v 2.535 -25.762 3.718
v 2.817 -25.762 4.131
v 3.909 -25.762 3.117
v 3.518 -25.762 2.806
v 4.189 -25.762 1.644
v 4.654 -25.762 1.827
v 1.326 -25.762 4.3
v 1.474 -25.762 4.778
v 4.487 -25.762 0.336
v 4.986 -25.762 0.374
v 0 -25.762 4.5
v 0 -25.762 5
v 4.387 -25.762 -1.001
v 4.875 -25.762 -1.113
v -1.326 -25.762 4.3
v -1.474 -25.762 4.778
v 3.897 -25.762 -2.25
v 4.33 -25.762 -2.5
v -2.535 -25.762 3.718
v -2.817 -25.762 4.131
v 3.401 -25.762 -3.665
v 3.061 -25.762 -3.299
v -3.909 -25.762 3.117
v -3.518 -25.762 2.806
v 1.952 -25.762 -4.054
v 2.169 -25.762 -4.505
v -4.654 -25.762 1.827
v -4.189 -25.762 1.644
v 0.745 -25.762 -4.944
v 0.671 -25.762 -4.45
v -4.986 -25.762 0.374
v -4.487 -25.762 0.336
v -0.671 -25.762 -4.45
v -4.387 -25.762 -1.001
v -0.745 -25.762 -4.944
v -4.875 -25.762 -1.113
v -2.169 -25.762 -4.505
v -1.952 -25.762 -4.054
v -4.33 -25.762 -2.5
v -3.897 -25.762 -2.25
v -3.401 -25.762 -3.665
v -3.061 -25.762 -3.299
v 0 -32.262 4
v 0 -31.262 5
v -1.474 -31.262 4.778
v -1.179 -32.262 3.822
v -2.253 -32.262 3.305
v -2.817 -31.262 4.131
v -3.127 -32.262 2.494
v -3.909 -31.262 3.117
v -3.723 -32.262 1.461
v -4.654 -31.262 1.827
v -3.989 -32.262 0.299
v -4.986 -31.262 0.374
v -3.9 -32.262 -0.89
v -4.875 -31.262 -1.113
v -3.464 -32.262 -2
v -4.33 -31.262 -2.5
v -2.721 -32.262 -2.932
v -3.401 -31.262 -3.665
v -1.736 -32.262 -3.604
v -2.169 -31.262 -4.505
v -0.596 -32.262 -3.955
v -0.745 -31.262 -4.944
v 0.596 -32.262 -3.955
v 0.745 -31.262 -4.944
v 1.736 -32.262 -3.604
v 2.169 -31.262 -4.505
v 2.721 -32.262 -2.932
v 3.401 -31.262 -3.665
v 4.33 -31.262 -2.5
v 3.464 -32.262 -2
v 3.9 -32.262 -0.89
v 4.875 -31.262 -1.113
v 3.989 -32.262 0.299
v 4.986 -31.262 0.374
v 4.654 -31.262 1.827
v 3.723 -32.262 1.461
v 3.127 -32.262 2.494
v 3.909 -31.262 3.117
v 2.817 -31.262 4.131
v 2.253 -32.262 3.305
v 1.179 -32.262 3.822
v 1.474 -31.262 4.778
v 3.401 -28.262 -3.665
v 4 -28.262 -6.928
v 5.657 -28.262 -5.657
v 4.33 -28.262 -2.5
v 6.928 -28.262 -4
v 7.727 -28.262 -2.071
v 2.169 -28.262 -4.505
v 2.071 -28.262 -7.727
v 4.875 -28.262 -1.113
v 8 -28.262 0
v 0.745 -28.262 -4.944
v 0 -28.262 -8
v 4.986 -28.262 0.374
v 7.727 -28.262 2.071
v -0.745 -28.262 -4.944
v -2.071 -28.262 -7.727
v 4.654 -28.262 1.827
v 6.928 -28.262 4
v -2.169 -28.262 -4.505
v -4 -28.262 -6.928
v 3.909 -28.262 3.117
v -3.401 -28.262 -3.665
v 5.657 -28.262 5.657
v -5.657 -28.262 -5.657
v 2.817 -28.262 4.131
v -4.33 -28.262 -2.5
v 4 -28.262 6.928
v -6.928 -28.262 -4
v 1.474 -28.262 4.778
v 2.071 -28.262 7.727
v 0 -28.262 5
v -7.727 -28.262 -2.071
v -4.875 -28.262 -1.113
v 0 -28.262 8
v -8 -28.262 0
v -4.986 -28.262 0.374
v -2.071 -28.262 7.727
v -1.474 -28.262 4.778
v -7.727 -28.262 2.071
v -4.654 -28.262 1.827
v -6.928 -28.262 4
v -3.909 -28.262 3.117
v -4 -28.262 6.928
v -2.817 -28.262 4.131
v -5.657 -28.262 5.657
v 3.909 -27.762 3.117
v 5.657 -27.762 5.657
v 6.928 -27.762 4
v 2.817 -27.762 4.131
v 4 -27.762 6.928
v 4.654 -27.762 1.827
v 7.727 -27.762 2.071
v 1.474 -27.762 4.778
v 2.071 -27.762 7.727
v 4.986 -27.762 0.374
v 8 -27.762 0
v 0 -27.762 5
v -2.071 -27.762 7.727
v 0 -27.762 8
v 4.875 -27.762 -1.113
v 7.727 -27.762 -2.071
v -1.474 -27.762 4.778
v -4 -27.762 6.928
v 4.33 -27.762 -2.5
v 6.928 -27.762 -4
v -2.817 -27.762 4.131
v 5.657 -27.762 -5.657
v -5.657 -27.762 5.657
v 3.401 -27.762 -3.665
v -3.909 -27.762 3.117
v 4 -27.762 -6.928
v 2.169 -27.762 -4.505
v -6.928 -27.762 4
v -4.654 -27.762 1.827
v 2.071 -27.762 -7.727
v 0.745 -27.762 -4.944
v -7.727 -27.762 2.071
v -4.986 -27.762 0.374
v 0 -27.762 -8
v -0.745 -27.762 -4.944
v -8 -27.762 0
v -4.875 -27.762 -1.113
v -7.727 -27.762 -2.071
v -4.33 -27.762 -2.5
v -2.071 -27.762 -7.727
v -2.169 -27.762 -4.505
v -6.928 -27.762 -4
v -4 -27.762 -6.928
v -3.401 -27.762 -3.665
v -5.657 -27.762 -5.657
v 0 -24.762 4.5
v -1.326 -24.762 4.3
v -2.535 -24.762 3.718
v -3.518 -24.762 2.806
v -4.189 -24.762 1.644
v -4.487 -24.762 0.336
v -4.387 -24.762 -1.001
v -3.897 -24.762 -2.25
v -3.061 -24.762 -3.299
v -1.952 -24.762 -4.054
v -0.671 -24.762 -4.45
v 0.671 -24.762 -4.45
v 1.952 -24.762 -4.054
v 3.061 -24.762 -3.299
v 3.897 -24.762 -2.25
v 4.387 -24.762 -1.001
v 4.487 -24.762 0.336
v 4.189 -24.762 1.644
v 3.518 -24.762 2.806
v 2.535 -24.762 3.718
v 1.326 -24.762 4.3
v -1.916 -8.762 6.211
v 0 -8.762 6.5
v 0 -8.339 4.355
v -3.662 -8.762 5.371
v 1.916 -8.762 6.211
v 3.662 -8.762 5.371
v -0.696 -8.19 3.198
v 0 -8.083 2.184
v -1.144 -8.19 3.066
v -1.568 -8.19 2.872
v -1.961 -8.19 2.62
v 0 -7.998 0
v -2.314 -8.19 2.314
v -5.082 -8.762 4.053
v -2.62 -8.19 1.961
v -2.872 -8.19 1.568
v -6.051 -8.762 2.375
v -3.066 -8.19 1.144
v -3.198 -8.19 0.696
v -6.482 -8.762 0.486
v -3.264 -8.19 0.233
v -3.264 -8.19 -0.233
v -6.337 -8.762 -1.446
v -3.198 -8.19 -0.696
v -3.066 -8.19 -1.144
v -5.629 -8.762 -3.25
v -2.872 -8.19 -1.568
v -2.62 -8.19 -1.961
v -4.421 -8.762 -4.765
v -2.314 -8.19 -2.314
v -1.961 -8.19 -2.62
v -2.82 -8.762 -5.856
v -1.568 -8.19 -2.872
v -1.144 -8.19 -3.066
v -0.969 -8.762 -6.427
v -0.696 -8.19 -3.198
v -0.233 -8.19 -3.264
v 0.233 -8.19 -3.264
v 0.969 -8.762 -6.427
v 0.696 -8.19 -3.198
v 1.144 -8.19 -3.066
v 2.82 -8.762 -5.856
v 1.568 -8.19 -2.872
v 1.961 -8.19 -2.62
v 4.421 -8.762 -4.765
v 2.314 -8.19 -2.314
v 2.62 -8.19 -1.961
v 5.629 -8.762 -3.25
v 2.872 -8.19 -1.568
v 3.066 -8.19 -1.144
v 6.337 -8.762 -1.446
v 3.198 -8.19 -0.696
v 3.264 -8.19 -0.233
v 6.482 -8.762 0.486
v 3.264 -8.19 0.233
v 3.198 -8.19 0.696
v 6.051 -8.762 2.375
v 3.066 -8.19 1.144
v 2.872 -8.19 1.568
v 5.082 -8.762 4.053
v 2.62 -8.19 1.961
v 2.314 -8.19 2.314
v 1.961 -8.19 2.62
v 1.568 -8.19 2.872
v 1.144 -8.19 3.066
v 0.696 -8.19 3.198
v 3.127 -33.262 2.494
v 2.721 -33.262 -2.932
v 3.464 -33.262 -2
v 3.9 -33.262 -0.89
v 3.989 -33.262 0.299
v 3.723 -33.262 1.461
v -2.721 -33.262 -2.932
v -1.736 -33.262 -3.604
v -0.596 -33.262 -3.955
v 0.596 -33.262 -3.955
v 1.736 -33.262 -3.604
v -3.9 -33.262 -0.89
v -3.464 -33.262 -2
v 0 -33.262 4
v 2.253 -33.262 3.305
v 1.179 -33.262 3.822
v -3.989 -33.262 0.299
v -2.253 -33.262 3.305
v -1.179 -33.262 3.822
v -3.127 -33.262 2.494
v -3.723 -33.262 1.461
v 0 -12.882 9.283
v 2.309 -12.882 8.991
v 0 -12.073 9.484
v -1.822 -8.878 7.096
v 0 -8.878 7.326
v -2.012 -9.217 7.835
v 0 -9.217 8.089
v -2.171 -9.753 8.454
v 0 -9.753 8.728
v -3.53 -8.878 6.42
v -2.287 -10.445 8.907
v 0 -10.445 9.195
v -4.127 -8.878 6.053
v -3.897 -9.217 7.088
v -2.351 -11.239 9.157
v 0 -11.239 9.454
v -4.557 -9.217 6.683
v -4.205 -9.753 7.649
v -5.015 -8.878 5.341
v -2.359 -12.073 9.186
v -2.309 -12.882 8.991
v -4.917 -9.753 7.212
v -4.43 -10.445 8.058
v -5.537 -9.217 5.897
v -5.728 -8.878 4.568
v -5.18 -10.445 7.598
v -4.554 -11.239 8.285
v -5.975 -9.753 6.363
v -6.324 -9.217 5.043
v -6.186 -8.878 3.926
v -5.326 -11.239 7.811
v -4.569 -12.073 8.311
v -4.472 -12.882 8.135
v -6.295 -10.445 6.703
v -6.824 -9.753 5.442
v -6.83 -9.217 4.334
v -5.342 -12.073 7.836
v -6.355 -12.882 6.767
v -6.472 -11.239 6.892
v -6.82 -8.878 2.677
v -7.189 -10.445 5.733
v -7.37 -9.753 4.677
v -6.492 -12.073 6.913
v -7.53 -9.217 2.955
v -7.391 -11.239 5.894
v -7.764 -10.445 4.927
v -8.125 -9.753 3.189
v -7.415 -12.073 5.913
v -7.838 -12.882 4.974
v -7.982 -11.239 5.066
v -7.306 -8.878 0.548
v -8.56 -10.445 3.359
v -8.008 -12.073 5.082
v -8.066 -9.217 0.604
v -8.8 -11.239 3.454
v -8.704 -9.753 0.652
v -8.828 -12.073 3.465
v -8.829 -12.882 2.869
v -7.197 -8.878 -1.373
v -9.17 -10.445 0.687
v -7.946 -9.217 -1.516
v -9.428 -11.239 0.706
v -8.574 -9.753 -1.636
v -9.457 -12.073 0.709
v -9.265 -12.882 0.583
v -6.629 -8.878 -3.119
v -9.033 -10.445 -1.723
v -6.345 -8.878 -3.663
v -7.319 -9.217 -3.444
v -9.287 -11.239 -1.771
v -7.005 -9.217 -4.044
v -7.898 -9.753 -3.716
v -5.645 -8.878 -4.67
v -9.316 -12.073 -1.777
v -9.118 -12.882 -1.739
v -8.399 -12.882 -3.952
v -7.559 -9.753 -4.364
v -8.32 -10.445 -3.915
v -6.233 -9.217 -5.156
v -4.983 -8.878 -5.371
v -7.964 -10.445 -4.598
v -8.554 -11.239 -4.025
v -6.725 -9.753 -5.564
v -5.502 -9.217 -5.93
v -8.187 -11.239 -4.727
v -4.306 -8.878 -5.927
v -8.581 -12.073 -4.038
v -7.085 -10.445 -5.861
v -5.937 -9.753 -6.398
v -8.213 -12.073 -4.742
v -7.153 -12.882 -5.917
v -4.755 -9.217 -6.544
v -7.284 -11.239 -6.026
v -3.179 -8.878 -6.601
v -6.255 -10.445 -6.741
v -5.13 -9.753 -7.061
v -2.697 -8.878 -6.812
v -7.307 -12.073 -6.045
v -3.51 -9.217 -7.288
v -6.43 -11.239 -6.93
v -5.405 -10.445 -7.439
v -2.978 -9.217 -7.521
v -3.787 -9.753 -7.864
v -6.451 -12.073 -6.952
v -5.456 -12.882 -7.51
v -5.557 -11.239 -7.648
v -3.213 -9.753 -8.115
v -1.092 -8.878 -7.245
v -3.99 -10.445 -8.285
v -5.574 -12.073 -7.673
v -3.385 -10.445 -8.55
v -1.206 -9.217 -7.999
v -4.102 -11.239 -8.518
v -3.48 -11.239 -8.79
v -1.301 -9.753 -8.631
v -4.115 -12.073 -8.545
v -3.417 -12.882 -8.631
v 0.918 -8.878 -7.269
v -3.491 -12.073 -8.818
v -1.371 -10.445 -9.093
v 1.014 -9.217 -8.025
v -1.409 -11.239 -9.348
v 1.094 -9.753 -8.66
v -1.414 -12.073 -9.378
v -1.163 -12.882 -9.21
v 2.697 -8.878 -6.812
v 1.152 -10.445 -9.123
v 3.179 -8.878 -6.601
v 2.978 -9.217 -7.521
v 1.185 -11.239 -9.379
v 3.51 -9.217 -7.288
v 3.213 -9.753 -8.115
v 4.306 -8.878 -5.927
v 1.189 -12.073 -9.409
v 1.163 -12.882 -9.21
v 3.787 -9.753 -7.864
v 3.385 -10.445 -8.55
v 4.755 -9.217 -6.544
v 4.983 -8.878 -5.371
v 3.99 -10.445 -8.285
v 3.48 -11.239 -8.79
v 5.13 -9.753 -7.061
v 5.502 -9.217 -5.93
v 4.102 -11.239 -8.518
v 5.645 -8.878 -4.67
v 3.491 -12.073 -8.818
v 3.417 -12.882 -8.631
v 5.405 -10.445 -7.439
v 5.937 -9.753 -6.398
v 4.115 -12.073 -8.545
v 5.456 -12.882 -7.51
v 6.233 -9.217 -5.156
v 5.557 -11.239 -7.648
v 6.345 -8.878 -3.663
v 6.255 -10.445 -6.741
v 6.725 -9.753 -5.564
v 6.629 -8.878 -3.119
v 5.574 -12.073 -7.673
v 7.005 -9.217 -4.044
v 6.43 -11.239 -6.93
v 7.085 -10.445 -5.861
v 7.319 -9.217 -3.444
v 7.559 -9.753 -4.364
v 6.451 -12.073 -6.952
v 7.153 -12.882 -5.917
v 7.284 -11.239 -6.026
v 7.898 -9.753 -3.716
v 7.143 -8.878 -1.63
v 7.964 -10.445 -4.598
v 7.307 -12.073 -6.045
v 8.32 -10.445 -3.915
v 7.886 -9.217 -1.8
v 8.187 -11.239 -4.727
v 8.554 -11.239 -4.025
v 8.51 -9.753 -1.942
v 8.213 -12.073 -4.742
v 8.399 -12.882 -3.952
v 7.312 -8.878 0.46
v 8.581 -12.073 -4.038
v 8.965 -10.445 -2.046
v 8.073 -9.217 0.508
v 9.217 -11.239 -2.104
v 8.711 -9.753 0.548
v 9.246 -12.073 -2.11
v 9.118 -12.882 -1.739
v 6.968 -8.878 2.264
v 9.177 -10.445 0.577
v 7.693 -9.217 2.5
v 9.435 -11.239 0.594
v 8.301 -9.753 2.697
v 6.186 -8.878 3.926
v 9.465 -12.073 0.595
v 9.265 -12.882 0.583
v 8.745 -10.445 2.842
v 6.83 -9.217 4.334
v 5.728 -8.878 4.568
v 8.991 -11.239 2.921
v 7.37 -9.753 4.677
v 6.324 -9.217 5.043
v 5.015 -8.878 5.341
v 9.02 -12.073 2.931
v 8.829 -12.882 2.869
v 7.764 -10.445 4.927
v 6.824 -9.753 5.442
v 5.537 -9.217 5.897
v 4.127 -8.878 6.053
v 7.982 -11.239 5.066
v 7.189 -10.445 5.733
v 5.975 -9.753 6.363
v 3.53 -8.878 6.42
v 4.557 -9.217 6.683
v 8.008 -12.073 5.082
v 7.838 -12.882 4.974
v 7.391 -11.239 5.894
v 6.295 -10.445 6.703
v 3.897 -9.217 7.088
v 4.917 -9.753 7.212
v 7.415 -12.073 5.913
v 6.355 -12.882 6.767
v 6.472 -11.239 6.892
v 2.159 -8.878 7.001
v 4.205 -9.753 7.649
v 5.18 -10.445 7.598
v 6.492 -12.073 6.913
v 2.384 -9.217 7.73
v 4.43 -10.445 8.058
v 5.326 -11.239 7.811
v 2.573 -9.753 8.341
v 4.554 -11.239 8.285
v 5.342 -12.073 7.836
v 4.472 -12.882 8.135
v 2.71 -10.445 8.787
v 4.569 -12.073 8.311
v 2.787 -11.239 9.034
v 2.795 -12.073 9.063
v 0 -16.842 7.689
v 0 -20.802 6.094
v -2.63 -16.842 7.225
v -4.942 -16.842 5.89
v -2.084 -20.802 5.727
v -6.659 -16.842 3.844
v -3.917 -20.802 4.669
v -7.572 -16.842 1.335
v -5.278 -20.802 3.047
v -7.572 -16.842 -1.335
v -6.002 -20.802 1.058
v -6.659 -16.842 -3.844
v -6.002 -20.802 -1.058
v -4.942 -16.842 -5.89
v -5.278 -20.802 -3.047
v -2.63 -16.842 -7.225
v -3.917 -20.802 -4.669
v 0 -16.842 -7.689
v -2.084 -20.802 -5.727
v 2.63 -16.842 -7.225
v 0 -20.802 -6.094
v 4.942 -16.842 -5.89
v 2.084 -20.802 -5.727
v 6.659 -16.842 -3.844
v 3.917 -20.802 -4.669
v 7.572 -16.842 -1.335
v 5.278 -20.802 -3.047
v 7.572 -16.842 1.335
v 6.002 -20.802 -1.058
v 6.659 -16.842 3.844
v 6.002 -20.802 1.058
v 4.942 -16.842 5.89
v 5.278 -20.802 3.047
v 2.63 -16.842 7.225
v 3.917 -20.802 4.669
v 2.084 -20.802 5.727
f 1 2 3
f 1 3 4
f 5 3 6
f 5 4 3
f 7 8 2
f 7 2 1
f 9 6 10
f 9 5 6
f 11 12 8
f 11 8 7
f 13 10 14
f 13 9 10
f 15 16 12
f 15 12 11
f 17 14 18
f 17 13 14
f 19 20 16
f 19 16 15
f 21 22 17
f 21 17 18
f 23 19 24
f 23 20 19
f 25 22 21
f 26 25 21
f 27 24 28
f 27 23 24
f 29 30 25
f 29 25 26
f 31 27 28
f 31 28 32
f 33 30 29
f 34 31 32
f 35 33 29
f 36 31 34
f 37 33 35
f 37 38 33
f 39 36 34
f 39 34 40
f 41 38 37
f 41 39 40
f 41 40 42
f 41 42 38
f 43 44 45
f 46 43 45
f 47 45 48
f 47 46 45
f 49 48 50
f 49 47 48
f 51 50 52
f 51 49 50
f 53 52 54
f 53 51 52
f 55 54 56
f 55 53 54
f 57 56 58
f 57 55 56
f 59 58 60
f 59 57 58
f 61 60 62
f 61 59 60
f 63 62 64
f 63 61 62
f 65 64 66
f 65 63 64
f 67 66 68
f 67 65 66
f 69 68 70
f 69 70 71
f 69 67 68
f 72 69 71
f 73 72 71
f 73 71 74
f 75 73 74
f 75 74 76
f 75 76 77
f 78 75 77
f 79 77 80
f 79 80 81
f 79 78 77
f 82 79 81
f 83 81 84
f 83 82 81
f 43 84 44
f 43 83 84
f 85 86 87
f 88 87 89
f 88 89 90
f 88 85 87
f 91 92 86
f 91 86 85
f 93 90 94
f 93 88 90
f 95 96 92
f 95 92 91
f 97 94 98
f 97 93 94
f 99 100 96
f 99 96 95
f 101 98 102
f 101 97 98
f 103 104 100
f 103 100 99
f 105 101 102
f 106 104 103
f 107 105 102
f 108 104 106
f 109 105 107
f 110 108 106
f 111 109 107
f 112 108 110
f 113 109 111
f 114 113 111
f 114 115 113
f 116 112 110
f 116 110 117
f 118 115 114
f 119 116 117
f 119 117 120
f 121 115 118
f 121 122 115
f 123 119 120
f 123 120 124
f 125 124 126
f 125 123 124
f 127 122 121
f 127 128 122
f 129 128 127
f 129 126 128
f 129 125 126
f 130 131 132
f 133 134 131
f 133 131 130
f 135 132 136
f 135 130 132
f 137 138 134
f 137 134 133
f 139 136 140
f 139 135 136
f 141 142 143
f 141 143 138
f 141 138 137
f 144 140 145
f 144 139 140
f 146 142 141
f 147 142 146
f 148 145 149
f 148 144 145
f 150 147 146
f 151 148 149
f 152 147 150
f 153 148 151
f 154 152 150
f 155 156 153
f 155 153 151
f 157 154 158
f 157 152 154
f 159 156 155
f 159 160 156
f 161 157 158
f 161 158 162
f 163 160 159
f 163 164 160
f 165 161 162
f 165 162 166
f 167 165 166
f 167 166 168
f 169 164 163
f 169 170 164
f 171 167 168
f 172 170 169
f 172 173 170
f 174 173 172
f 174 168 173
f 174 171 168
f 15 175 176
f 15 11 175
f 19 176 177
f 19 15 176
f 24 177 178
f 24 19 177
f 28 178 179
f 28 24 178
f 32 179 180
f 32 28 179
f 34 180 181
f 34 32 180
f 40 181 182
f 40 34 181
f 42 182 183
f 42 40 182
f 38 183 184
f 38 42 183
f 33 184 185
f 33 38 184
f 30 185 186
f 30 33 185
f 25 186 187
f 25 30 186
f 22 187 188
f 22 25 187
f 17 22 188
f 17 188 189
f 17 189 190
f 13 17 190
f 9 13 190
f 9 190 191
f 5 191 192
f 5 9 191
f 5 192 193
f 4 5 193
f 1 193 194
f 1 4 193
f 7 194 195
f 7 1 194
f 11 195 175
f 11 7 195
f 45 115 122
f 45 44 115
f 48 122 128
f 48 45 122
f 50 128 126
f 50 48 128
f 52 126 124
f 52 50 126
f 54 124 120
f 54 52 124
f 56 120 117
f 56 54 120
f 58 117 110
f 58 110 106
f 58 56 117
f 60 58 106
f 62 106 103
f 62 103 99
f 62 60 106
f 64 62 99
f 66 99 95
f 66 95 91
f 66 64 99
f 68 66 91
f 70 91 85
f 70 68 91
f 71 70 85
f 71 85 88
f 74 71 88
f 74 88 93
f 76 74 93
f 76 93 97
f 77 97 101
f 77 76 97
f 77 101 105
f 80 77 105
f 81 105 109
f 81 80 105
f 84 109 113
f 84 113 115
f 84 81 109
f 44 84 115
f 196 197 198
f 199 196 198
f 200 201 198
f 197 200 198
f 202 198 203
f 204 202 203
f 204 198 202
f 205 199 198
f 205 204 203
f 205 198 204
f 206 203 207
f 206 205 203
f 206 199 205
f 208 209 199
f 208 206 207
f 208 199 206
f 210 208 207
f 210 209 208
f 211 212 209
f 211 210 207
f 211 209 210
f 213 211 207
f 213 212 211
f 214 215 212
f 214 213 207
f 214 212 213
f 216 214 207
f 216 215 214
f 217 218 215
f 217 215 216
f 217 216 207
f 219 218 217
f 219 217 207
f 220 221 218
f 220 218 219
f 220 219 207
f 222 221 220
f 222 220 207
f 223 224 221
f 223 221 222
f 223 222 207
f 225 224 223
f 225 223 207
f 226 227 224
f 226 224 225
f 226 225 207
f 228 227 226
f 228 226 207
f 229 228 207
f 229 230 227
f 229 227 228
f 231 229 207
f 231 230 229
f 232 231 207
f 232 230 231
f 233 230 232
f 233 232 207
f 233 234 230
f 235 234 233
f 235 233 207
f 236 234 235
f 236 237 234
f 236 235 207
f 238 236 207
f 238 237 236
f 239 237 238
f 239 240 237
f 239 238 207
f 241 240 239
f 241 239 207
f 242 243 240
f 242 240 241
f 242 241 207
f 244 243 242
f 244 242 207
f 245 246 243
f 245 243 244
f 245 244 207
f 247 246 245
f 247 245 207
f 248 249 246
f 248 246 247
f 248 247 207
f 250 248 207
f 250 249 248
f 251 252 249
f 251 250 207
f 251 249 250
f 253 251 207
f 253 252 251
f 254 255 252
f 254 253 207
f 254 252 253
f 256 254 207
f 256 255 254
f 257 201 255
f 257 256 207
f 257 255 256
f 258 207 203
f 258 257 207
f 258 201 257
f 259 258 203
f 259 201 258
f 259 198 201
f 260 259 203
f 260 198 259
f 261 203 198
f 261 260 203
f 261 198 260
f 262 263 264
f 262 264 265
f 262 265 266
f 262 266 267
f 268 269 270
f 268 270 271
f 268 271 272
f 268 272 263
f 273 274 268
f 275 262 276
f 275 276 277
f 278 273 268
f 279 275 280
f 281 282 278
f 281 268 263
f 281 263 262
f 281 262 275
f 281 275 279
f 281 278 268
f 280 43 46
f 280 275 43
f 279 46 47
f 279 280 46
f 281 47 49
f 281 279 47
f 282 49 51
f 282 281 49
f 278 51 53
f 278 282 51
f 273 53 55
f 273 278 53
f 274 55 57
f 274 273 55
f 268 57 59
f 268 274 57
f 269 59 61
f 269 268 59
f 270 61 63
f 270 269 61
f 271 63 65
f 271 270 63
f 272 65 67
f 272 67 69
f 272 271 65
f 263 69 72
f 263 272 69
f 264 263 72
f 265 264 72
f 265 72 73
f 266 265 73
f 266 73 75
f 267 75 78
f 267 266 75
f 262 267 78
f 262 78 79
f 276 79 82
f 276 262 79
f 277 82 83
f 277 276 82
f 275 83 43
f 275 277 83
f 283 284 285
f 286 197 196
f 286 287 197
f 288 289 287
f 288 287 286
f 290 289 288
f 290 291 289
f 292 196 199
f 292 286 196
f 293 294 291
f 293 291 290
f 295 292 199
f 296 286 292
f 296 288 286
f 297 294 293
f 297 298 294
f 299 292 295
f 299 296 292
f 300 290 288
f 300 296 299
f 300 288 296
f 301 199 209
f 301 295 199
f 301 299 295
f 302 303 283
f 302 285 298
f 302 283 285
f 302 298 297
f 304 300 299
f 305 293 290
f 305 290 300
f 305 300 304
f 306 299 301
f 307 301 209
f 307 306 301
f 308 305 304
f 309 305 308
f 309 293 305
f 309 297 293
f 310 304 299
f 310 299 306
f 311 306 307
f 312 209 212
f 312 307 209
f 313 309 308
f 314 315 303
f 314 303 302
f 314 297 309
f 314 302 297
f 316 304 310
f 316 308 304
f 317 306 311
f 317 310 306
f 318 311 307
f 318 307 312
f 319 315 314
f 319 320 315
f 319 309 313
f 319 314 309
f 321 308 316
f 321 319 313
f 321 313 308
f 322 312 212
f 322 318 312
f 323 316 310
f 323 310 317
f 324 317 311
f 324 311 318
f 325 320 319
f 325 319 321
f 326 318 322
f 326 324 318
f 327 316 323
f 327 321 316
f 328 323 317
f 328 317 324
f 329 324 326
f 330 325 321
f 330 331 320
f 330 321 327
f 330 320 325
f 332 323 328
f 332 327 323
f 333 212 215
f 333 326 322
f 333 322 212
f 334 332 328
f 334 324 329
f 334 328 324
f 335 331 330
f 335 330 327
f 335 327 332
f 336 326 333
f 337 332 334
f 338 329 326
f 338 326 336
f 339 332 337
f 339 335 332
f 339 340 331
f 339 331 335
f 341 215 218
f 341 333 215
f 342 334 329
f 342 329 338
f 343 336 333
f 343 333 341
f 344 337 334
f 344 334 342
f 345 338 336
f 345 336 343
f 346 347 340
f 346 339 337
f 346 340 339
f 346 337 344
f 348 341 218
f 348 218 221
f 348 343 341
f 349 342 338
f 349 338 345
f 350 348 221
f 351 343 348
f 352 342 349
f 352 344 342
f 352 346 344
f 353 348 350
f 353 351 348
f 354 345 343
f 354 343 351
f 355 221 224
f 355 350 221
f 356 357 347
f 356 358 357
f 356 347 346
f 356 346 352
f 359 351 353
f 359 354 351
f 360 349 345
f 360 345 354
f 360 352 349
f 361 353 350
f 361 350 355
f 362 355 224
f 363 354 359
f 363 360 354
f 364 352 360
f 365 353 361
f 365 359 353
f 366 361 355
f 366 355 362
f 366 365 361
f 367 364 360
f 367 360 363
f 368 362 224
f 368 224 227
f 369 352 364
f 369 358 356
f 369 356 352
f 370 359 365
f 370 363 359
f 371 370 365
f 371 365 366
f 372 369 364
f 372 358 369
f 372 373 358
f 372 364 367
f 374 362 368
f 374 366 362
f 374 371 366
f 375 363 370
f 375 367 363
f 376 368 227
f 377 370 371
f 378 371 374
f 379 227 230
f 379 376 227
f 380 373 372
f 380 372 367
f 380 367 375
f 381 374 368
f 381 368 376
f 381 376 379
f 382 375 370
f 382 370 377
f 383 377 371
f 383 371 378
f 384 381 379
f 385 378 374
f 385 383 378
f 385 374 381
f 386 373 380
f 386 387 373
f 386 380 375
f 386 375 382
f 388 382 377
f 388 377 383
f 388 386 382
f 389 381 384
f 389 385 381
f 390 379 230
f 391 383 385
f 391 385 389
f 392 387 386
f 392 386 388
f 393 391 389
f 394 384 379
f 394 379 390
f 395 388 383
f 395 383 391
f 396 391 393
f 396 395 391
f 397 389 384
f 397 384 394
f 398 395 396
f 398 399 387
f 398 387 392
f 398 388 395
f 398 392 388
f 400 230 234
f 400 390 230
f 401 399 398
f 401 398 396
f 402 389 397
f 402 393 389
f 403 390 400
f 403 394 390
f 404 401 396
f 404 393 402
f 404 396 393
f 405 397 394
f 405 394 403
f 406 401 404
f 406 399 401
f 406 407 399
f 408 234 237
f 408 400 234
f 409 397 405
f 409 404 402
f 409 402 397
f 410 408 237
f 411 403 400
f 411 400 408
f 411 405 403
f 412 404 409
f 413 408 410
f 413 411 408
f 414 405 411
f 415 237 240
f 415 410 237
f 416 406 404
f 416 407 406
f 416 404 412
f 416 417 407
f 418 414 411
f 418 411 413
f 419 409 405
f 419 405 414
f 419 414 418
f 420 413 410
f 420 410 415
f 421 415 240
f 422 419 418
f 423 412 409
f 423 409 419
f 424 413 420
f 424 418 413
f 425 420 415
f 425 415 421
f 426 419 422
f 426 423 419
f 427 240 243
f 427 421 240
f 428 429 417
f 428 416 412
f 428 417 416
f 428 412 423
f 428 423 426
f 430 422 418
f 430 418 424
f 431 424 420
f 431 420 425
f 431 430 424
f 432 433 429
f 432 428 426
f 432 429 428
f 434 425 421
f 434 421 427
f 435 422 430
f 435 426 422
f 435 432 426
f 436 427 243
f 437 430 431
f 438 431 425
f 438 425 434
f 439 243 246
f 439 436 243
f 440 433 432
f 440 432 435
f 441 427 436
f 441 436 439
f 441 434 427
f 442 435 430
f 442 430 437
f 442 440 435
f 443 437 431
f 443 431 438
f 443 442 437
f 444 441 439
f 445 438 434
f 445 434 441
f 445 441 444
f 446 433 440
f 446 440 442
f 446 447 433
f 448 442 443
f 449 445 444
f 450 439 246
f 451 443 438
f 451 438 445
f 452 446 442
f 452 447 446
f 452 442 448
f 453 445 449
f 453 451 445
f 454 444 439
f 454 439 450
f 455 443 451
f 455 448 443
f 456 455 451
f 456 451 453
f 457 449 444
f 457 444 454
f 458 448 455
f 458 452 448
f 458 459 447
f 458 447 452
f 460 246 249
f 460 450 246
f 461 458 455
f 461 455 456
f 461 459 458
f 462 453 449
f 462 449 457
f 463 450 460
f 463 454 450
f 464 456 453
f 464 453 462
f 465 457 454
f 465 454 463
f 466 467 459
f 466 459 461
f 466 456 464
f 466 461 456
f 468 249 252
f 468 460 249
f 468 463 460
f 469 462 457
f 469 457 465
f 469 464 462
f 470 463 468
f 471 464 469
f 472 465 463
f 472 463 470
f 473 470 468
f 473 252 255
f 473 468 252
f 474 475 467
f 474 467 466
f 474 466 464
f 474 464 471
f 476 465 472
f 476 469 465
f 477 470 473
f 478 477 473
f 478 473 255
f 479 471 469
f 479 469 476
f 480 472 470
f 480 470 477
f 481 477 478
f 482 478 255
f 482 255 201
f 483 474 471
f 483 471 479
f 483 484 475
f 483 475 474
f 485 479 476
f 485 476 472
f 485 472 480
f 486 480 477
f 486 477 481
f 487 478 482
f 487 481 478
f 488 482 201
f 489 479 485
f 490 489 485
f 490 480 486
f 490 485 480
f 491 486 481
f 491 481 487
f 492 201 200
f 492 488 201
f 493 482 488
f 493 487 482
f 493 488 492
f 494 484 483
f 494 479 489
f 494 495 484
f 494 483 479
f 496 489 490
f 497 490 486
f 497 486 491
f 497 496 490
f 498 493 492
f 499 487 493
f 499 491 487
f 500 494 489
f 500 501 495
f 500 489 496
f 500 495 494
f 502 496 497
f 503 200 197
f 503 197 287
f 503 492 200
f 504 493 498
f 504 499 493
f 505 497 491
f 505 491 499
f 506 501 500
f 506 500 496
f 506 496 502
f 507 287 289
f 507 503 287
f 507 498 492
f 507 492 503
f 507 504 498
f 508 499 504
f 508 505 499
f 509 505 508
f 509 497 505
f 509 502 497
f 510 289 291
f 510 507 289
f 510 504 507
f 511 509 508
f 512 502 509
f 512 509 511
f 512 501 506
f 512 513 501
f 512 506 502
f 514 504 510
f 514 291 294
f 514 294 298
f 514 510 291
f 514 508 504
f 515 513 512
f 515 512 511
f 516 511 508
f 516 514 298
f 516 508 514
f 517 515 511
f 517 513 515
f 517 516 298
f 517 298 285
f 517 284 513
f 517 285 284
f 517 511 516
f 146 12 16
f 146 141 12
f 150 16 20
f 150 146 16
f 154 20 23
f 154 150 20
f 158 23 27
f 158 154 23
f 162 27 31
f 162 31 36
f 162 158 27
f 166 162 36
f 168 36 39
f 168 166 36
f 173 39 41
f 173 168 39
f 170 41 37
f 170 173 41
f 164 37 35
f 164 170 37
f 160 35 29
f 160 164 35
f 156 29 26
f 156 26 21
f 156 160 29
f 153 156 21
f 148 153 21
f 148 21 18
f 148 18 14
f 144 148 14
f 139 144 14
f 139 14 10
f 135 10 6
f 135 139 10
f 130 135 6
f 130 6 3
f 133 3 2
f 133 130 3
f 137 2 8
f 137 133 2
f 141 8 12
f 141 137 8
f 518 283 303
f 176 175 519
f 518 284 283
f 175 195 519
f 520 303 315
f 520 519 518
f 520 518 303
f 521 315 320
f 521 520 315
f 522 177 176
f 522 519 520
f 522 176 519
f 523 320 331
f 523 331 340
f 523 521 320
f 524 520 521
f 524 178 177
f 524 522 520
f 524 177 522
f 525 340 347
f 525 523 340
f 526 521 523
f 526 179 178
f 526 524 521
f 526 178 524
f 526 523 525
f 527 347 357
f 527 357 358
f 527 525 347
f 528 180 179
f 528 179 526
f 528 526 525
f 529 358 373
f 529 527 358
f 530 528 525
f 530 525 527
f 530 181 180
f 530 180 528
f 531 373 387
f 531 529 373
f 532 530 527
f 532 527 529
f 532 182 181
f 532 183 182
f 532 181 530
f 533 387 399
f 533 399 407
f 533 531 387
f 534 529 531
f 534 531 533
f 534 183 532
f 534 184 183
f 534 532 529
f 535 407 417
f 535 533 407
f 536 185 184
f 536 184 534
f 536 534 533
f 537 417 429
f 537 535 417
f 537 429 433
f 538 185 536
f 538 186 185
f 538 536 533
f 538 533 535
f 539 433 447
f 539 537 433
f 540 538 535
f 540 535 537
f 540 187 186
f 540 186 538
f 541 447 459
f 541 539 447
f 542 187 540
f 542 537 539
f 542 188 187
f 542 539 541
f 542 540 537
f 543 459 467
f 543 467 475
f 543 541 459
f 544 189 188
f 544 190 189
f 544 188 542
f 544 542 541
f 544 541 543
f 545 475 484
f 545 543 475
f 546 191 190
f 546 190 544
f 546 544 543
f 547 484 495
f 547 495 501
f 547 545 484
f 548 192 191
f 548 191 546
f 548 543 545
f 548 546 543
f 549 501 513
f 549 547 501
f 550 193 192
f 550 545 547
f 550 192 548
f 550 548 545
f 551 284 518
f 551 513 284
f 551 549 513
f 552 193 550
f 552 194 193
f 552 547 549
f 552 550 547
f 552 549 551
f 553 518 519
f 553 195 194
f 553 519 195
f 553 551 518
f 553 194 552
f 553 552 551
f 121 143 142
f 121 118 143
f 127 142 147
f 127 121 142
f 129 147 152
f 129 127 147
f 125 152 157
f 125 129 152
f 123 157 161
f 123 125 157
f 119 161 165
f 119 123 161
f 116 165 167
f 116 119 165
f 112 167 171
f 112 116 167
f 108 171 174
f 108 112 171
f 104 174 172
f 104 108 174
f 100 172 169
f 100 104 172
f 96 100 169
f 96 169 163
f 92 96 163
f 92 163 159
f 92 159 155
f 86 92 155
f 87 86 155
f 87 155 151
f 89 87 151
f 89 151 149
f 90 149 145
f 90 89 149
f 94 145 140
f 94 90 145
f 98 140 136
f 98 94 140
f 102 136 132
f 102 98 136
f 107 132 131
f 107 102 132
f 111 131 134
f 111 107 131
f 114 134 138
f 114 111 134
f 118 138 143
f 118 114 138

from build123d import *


with BuildPart() as part:
    # Sketch1 → Revolve1 (revolve)
    with BuildSketch(Plane.XY, mode=Mode.PRIVATE) as revolve1_sk:
        with BuildLine():
            Line((0, -33.262039486), (0, -8.762039486))
            Line((0, -8.762039486), (-6.5, -8.762039486))
            ThreePointArc((-6.5, -8.762039486), (-8.986095711, -10.082953987), (-9.282911506, -12.88248741))
            Line((-9.282911506, -12.88248741), (-4.5, -24.762039486))
            Line((-4.5, -24.762039486), (-4.5, -25.762039486))
            Line((-4.5, -25.762039486), (-5, -25.762039486))
            Line((-5, -25.762039486), (-5, -27.762039486))
            Line((-5, -27.762039486), (-8, -27.762039486))
            Line((-8, -27.762039486), (-8, -28.262039486))
            Line((-8, -28.262039486), (-5, -28.262039486))
            Line((-5, -28.262039486), (-5, -31.262039486))
            Line((-5, -31.262039486), (-4, -32.262039486))
            Line((-4, -32.262039486), (-4, -33.262039486))
            Line((-4, -33.262039486), (0, -33.262039486))
        make_face()
        with BuildLine():
            Line((0, -8.762039486), (0, -7.998248901))
            ThreePointArc((0, -7.998248901), (-3.272360618, -8.189851173), (-6.5, -8.762039486))
            Line((-6.5, -8.762039486), (0, -8.762039486))
        make_face()
    revolve(revolve1_sk.sketch.rotate(Axis((0, 89.34036061, 0), (0, -1, 0)), 270), axis=Axis((0, 89.34036061, 0), (0, -1, 0)))


solid = part.part
